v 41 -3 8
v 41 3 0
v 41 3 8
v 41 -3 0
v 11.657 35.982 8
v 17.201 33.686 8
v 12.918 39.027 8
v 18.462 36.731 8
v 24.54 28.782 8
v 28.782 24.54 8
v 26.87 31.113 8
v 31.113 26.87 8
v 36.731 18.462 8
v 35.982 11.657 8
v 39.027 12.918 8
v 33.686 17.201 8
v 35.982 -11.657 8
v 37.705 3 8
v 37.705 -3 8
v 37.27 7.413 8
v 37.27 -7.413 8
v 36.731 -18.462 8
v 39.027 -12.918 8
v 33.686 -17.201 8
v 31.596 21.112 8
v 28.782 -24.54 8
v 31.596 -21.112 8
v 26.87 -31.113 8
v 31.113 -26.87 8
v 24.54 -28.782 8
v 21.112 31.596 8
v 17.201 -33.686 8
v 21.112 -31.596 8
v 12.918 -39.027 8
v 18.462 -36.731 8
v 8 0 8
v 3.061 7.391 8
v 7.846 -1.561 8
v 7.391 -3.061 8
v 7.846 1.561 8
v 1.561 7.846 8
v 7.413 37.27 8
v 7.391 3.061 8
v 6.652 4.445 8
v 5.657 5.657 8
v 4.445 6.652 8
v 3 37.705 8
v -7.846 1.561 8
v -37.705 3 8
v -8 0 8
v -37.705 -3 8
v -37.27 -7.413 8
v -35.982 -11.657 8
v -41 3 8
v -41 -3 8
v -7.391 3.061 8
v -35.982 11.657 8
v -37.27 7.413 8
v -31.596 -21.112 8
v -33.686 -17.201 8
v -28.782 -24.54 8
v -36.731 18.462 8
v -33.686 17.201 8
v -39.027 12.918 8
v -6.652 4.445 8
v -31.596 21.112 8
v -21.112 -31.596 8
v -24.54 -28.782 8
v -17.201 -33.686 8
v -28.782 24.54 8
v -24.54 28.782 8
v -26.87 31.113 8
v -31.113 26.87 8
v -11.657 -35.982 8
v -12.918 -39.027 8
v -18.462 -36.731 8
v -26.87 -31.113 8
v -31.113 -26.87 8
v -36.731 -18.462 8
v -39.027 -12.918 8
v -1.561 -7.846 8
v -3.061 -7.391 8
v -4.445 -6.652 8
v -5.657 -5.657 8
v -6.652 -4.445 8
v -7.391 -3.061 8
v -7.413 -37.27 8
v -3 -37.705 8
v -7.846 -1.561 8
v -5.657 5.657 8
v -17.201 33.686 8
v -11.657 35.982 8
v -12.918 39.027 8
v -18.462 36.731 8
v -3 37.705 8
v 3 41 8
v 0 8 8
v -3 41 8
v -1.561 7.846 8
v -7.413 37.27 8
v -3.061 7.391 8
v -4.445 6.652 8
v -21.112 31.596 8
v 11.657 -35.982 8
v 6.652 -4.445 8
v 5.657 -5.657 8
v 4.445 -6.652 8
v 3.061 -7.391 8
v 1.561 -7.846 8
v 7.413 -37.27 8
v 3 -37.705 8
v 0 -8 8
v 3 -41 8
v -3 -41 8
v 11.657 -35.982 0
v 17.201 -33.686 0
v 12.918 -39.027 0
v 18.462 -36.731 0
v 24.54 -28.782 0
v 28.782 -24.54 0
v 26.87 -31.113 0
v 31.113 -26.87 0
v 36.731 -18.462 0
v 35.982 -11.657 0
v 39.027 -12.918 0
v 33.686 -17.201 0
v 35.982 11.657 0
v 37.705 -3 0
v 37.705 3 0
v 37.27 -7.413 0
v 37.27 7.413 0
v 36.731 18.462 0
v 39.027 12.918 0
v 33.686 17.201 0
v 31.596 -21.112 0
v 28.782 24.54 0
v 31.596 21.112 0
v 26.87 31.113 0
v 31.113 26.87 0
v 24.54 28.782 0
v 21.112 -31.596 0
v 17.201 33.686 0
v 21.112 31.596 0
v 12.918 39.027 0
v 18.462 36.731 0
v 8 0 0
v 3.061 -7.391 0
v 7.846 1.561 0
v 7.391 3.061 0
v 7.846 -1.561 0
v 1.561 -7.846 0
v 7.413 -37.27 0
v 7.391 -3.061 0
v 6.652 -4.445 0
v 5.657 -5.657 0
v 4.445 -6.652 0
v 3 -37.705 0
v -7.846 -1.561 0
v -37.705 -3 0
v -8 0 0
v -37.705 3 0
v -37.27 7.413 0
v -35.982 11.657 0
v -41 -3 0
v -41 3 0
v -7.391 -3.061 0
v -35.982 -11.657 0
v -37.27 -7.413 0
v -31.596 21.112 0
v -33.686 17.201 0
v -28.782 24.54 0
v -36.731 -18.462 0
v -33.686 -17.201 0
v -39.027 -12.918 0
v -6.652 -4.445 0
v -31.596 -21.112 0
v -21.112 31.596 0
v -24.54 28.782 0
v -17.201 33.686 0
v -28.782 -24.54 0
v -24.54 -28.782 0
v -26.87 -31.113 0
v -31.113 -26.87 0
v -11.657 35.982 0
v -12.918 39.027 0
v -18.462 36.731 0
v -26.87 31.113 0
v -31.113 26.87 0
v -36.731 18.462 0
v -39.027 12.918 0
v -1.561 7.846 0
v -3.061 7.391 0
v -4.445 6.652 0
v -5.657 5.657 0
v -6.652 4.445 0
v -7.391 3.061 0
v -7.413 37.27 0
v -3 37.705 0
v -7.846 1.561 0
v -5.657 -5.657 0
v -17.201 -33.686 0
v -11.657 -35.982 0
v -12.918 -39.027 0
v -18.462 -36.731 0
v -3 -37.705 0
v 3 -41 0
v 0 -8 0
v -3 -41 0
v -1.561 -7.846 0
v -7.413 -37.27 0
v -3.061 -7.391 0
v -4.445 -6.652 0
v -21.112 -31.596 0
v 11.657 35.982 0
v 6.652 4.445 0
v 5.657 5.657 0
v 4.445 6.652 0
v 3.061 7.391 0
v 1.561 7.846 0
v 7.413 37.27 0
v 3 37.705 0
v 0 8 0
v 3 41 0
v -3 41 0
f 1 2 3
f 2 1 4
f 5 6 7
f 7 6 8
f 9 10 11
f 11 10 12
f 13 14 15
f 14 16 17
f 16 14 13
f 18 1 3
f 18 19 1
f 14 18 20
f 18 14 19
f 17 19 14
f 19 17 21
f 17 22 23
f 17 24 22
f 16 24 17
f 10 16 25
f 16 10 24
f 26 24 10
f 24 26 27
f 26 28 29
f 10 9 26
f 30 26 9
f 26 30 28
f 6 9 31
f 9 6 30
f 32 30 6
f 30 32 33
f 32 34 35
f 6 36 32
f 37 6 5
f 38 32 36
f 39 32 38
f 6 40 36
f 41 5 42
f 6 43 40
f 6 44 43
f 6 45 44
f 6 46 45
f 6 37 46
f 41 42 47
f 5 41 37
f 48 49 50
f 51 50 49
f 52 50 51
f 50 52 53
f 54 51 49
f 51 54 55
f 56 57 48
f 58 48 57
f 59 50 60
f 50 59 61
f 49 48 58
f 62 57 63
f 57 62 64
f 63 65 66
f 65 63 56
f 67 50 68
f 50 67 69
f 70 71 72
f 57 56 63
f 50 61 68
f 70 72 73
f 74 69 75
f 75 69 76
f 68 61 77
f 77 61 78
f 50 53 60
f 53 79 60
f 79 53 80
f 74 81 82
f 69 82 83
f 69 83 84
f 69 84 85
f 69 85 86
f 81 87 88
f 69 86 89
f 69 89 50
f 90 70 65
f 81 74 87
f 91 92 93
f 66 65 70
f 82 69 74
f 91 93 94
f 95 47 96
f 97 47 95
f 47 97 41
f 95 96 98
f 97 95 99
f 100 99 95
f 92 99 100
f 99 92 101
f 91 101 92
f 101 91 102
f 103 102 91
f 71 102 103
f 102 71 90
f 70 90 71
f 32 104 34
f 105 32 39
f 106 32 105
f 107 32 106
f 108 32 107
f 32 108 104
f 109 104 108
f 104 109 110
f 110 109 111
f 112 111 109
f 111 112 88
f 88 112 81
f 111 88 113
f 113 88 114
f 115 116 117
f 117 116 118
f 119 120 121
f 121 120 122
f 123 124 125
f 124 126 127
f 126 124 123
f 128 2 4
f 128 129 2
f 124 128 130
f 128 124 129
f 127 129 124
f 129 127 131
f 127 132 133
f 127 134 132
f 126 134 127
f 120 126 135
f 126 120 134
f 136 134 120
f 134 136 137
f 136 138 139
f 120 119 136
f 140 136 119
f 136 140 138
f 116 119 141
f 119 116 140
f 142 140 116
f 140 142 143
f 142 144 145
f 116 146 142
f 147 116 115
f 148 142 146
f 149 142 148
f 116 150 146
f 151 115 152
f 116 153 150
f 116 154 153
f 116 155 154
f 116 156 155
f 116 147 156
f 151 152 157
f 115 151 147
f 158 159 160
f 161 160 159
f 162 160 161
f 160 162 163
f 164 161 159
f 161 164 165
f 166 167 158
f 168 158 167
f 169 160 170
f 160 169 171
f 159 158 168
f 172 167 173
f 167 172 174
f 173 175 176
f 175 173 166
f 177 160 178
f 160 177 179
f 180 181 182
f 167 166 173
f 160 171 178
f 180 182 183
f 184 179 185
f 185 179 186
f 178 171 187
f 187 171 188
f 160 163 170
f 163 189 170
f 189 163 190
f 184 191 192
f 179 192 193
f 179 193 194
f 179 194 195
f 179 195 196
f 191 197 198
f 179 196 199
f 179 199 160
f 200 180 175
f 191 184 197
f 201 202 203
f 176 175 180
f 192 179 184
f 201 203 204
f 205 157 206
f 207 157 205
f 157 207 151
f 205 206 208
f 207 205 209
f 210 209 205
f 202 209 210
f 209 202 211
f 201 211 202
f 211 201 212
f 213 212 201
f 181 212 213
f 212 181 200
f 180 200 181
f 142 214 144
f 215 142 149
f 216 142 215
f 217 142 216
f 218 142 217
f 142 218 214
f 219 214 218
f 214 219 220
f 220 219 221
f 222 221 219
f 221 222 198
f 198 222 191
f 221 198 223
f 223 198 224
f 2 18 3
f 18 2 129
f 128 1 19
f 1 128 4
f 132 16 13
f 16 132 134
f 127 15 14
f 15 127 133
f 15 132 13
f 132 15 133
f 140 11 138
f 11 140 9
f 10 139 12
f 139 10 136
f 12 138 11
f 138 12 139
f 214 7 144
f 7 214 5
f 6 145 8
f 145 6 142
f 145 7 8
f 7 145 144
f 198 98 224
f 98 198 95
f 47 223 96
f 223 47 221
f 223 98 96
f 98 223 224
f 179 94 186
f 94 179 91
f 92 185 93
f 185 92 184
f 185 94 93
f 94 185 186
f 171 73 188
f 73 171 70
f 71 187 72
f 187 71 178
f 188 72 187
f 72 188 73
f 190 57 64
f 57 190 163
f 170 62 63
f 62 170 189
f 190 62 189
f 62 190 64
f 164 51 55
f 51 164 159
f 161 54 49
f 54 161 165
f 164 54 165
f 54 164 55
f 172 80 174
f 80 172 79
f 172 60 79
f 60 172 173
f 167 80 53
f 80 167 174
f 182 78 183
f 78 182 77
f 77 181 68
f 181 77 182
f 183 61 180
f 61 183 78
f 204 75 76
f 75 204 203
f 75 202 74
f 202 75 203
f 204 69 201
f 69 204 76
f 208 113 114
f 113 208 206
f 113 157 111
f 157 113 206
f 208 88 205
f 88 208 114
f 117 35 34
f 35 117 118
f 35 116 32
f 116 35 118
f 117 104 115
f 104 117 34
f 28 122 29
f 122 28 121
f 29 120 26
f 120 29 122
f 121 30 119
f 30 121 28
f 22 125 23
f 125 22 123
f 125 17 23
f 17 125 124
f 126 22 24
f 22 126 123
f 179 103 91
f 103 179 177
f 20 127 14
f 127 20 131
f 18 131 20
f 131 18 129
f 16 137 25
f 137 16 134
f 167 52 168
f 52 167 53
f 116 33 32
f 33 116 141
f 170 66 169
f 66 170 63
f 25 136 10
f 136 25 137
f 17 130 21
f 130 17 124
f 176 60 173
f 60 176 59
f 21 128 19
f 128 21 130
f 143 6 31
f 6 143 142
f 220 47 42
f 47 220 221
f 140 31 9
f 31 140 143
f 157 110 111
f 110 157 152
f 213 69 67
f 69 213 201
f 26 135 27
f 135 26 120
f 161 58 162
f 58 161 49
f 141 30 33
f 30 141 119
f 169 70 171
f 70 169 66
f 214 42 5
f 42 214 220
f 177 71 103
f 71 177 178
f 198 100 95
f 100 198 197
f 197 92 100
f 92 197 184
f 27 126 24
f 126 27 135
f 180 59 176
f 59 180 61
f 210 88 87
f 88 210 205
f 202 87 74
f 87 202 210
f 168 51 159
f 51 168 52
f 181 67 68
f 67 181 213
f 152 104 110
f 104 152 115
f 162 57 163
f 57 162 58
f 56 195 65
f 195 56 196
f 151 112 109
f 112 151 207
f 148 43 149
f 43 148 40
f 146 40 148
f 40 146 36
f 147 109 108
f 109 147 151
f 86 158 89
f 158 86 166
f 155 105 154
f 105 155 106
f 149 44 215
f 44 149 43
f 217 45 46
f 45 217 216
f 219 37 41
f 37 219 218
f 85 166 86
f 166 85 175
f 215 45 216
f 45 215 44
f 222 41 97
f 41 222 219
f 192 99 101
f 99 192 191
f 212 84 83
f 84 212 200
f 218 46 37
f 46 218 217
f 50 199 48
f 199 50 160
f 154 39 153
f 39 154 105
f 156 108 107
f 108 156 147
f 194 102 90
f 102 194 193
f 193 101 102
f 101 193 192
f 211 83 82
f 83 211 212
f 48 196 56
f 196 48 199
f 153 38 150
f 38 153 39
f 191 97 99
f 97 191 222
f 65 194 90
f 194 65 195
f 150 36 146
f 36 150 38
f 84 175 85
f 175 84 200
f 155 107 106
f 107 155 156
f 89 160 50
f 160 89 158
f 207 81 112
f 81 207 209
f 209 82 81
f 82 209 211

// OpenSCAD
$fn = 32;

// ----------------------------------------------------------------------
// Spur blank: bored gear blank
// ----------------------------------------------------------------------

// --- parameters (mm) ---
disc_r = 38;              // blank root radius
disc_t = 8;               // blank thickness
n_teeth = 16;             // stub tooth count
tooth_w = 6;              // tooth width at the root
tooth_h = 3;              // tooth height above the root
bore_r = 8;               // central bore radius

out_r = disc_r + tooth_h;  // tip radius
bbox_x = 82.0;  // measured width over the teeth
bbox_y = 82.0;  // measured depth over the teeth

difference() {
union() {
  cylinder(r = disc_r, h = disc_t);
  for (i = [0 : n_teeth - 1])
    rotate([0, 0, i * 360 / n_teeth])
      translate([disc_r - 1, -tooth_w / 2, 0])
        cube([tooth_h + 1, tooth_w, disc_t]);
}
  translate([0, 0, -1]) cylinder(r = bore_r, h = disc_t + 2);
}
